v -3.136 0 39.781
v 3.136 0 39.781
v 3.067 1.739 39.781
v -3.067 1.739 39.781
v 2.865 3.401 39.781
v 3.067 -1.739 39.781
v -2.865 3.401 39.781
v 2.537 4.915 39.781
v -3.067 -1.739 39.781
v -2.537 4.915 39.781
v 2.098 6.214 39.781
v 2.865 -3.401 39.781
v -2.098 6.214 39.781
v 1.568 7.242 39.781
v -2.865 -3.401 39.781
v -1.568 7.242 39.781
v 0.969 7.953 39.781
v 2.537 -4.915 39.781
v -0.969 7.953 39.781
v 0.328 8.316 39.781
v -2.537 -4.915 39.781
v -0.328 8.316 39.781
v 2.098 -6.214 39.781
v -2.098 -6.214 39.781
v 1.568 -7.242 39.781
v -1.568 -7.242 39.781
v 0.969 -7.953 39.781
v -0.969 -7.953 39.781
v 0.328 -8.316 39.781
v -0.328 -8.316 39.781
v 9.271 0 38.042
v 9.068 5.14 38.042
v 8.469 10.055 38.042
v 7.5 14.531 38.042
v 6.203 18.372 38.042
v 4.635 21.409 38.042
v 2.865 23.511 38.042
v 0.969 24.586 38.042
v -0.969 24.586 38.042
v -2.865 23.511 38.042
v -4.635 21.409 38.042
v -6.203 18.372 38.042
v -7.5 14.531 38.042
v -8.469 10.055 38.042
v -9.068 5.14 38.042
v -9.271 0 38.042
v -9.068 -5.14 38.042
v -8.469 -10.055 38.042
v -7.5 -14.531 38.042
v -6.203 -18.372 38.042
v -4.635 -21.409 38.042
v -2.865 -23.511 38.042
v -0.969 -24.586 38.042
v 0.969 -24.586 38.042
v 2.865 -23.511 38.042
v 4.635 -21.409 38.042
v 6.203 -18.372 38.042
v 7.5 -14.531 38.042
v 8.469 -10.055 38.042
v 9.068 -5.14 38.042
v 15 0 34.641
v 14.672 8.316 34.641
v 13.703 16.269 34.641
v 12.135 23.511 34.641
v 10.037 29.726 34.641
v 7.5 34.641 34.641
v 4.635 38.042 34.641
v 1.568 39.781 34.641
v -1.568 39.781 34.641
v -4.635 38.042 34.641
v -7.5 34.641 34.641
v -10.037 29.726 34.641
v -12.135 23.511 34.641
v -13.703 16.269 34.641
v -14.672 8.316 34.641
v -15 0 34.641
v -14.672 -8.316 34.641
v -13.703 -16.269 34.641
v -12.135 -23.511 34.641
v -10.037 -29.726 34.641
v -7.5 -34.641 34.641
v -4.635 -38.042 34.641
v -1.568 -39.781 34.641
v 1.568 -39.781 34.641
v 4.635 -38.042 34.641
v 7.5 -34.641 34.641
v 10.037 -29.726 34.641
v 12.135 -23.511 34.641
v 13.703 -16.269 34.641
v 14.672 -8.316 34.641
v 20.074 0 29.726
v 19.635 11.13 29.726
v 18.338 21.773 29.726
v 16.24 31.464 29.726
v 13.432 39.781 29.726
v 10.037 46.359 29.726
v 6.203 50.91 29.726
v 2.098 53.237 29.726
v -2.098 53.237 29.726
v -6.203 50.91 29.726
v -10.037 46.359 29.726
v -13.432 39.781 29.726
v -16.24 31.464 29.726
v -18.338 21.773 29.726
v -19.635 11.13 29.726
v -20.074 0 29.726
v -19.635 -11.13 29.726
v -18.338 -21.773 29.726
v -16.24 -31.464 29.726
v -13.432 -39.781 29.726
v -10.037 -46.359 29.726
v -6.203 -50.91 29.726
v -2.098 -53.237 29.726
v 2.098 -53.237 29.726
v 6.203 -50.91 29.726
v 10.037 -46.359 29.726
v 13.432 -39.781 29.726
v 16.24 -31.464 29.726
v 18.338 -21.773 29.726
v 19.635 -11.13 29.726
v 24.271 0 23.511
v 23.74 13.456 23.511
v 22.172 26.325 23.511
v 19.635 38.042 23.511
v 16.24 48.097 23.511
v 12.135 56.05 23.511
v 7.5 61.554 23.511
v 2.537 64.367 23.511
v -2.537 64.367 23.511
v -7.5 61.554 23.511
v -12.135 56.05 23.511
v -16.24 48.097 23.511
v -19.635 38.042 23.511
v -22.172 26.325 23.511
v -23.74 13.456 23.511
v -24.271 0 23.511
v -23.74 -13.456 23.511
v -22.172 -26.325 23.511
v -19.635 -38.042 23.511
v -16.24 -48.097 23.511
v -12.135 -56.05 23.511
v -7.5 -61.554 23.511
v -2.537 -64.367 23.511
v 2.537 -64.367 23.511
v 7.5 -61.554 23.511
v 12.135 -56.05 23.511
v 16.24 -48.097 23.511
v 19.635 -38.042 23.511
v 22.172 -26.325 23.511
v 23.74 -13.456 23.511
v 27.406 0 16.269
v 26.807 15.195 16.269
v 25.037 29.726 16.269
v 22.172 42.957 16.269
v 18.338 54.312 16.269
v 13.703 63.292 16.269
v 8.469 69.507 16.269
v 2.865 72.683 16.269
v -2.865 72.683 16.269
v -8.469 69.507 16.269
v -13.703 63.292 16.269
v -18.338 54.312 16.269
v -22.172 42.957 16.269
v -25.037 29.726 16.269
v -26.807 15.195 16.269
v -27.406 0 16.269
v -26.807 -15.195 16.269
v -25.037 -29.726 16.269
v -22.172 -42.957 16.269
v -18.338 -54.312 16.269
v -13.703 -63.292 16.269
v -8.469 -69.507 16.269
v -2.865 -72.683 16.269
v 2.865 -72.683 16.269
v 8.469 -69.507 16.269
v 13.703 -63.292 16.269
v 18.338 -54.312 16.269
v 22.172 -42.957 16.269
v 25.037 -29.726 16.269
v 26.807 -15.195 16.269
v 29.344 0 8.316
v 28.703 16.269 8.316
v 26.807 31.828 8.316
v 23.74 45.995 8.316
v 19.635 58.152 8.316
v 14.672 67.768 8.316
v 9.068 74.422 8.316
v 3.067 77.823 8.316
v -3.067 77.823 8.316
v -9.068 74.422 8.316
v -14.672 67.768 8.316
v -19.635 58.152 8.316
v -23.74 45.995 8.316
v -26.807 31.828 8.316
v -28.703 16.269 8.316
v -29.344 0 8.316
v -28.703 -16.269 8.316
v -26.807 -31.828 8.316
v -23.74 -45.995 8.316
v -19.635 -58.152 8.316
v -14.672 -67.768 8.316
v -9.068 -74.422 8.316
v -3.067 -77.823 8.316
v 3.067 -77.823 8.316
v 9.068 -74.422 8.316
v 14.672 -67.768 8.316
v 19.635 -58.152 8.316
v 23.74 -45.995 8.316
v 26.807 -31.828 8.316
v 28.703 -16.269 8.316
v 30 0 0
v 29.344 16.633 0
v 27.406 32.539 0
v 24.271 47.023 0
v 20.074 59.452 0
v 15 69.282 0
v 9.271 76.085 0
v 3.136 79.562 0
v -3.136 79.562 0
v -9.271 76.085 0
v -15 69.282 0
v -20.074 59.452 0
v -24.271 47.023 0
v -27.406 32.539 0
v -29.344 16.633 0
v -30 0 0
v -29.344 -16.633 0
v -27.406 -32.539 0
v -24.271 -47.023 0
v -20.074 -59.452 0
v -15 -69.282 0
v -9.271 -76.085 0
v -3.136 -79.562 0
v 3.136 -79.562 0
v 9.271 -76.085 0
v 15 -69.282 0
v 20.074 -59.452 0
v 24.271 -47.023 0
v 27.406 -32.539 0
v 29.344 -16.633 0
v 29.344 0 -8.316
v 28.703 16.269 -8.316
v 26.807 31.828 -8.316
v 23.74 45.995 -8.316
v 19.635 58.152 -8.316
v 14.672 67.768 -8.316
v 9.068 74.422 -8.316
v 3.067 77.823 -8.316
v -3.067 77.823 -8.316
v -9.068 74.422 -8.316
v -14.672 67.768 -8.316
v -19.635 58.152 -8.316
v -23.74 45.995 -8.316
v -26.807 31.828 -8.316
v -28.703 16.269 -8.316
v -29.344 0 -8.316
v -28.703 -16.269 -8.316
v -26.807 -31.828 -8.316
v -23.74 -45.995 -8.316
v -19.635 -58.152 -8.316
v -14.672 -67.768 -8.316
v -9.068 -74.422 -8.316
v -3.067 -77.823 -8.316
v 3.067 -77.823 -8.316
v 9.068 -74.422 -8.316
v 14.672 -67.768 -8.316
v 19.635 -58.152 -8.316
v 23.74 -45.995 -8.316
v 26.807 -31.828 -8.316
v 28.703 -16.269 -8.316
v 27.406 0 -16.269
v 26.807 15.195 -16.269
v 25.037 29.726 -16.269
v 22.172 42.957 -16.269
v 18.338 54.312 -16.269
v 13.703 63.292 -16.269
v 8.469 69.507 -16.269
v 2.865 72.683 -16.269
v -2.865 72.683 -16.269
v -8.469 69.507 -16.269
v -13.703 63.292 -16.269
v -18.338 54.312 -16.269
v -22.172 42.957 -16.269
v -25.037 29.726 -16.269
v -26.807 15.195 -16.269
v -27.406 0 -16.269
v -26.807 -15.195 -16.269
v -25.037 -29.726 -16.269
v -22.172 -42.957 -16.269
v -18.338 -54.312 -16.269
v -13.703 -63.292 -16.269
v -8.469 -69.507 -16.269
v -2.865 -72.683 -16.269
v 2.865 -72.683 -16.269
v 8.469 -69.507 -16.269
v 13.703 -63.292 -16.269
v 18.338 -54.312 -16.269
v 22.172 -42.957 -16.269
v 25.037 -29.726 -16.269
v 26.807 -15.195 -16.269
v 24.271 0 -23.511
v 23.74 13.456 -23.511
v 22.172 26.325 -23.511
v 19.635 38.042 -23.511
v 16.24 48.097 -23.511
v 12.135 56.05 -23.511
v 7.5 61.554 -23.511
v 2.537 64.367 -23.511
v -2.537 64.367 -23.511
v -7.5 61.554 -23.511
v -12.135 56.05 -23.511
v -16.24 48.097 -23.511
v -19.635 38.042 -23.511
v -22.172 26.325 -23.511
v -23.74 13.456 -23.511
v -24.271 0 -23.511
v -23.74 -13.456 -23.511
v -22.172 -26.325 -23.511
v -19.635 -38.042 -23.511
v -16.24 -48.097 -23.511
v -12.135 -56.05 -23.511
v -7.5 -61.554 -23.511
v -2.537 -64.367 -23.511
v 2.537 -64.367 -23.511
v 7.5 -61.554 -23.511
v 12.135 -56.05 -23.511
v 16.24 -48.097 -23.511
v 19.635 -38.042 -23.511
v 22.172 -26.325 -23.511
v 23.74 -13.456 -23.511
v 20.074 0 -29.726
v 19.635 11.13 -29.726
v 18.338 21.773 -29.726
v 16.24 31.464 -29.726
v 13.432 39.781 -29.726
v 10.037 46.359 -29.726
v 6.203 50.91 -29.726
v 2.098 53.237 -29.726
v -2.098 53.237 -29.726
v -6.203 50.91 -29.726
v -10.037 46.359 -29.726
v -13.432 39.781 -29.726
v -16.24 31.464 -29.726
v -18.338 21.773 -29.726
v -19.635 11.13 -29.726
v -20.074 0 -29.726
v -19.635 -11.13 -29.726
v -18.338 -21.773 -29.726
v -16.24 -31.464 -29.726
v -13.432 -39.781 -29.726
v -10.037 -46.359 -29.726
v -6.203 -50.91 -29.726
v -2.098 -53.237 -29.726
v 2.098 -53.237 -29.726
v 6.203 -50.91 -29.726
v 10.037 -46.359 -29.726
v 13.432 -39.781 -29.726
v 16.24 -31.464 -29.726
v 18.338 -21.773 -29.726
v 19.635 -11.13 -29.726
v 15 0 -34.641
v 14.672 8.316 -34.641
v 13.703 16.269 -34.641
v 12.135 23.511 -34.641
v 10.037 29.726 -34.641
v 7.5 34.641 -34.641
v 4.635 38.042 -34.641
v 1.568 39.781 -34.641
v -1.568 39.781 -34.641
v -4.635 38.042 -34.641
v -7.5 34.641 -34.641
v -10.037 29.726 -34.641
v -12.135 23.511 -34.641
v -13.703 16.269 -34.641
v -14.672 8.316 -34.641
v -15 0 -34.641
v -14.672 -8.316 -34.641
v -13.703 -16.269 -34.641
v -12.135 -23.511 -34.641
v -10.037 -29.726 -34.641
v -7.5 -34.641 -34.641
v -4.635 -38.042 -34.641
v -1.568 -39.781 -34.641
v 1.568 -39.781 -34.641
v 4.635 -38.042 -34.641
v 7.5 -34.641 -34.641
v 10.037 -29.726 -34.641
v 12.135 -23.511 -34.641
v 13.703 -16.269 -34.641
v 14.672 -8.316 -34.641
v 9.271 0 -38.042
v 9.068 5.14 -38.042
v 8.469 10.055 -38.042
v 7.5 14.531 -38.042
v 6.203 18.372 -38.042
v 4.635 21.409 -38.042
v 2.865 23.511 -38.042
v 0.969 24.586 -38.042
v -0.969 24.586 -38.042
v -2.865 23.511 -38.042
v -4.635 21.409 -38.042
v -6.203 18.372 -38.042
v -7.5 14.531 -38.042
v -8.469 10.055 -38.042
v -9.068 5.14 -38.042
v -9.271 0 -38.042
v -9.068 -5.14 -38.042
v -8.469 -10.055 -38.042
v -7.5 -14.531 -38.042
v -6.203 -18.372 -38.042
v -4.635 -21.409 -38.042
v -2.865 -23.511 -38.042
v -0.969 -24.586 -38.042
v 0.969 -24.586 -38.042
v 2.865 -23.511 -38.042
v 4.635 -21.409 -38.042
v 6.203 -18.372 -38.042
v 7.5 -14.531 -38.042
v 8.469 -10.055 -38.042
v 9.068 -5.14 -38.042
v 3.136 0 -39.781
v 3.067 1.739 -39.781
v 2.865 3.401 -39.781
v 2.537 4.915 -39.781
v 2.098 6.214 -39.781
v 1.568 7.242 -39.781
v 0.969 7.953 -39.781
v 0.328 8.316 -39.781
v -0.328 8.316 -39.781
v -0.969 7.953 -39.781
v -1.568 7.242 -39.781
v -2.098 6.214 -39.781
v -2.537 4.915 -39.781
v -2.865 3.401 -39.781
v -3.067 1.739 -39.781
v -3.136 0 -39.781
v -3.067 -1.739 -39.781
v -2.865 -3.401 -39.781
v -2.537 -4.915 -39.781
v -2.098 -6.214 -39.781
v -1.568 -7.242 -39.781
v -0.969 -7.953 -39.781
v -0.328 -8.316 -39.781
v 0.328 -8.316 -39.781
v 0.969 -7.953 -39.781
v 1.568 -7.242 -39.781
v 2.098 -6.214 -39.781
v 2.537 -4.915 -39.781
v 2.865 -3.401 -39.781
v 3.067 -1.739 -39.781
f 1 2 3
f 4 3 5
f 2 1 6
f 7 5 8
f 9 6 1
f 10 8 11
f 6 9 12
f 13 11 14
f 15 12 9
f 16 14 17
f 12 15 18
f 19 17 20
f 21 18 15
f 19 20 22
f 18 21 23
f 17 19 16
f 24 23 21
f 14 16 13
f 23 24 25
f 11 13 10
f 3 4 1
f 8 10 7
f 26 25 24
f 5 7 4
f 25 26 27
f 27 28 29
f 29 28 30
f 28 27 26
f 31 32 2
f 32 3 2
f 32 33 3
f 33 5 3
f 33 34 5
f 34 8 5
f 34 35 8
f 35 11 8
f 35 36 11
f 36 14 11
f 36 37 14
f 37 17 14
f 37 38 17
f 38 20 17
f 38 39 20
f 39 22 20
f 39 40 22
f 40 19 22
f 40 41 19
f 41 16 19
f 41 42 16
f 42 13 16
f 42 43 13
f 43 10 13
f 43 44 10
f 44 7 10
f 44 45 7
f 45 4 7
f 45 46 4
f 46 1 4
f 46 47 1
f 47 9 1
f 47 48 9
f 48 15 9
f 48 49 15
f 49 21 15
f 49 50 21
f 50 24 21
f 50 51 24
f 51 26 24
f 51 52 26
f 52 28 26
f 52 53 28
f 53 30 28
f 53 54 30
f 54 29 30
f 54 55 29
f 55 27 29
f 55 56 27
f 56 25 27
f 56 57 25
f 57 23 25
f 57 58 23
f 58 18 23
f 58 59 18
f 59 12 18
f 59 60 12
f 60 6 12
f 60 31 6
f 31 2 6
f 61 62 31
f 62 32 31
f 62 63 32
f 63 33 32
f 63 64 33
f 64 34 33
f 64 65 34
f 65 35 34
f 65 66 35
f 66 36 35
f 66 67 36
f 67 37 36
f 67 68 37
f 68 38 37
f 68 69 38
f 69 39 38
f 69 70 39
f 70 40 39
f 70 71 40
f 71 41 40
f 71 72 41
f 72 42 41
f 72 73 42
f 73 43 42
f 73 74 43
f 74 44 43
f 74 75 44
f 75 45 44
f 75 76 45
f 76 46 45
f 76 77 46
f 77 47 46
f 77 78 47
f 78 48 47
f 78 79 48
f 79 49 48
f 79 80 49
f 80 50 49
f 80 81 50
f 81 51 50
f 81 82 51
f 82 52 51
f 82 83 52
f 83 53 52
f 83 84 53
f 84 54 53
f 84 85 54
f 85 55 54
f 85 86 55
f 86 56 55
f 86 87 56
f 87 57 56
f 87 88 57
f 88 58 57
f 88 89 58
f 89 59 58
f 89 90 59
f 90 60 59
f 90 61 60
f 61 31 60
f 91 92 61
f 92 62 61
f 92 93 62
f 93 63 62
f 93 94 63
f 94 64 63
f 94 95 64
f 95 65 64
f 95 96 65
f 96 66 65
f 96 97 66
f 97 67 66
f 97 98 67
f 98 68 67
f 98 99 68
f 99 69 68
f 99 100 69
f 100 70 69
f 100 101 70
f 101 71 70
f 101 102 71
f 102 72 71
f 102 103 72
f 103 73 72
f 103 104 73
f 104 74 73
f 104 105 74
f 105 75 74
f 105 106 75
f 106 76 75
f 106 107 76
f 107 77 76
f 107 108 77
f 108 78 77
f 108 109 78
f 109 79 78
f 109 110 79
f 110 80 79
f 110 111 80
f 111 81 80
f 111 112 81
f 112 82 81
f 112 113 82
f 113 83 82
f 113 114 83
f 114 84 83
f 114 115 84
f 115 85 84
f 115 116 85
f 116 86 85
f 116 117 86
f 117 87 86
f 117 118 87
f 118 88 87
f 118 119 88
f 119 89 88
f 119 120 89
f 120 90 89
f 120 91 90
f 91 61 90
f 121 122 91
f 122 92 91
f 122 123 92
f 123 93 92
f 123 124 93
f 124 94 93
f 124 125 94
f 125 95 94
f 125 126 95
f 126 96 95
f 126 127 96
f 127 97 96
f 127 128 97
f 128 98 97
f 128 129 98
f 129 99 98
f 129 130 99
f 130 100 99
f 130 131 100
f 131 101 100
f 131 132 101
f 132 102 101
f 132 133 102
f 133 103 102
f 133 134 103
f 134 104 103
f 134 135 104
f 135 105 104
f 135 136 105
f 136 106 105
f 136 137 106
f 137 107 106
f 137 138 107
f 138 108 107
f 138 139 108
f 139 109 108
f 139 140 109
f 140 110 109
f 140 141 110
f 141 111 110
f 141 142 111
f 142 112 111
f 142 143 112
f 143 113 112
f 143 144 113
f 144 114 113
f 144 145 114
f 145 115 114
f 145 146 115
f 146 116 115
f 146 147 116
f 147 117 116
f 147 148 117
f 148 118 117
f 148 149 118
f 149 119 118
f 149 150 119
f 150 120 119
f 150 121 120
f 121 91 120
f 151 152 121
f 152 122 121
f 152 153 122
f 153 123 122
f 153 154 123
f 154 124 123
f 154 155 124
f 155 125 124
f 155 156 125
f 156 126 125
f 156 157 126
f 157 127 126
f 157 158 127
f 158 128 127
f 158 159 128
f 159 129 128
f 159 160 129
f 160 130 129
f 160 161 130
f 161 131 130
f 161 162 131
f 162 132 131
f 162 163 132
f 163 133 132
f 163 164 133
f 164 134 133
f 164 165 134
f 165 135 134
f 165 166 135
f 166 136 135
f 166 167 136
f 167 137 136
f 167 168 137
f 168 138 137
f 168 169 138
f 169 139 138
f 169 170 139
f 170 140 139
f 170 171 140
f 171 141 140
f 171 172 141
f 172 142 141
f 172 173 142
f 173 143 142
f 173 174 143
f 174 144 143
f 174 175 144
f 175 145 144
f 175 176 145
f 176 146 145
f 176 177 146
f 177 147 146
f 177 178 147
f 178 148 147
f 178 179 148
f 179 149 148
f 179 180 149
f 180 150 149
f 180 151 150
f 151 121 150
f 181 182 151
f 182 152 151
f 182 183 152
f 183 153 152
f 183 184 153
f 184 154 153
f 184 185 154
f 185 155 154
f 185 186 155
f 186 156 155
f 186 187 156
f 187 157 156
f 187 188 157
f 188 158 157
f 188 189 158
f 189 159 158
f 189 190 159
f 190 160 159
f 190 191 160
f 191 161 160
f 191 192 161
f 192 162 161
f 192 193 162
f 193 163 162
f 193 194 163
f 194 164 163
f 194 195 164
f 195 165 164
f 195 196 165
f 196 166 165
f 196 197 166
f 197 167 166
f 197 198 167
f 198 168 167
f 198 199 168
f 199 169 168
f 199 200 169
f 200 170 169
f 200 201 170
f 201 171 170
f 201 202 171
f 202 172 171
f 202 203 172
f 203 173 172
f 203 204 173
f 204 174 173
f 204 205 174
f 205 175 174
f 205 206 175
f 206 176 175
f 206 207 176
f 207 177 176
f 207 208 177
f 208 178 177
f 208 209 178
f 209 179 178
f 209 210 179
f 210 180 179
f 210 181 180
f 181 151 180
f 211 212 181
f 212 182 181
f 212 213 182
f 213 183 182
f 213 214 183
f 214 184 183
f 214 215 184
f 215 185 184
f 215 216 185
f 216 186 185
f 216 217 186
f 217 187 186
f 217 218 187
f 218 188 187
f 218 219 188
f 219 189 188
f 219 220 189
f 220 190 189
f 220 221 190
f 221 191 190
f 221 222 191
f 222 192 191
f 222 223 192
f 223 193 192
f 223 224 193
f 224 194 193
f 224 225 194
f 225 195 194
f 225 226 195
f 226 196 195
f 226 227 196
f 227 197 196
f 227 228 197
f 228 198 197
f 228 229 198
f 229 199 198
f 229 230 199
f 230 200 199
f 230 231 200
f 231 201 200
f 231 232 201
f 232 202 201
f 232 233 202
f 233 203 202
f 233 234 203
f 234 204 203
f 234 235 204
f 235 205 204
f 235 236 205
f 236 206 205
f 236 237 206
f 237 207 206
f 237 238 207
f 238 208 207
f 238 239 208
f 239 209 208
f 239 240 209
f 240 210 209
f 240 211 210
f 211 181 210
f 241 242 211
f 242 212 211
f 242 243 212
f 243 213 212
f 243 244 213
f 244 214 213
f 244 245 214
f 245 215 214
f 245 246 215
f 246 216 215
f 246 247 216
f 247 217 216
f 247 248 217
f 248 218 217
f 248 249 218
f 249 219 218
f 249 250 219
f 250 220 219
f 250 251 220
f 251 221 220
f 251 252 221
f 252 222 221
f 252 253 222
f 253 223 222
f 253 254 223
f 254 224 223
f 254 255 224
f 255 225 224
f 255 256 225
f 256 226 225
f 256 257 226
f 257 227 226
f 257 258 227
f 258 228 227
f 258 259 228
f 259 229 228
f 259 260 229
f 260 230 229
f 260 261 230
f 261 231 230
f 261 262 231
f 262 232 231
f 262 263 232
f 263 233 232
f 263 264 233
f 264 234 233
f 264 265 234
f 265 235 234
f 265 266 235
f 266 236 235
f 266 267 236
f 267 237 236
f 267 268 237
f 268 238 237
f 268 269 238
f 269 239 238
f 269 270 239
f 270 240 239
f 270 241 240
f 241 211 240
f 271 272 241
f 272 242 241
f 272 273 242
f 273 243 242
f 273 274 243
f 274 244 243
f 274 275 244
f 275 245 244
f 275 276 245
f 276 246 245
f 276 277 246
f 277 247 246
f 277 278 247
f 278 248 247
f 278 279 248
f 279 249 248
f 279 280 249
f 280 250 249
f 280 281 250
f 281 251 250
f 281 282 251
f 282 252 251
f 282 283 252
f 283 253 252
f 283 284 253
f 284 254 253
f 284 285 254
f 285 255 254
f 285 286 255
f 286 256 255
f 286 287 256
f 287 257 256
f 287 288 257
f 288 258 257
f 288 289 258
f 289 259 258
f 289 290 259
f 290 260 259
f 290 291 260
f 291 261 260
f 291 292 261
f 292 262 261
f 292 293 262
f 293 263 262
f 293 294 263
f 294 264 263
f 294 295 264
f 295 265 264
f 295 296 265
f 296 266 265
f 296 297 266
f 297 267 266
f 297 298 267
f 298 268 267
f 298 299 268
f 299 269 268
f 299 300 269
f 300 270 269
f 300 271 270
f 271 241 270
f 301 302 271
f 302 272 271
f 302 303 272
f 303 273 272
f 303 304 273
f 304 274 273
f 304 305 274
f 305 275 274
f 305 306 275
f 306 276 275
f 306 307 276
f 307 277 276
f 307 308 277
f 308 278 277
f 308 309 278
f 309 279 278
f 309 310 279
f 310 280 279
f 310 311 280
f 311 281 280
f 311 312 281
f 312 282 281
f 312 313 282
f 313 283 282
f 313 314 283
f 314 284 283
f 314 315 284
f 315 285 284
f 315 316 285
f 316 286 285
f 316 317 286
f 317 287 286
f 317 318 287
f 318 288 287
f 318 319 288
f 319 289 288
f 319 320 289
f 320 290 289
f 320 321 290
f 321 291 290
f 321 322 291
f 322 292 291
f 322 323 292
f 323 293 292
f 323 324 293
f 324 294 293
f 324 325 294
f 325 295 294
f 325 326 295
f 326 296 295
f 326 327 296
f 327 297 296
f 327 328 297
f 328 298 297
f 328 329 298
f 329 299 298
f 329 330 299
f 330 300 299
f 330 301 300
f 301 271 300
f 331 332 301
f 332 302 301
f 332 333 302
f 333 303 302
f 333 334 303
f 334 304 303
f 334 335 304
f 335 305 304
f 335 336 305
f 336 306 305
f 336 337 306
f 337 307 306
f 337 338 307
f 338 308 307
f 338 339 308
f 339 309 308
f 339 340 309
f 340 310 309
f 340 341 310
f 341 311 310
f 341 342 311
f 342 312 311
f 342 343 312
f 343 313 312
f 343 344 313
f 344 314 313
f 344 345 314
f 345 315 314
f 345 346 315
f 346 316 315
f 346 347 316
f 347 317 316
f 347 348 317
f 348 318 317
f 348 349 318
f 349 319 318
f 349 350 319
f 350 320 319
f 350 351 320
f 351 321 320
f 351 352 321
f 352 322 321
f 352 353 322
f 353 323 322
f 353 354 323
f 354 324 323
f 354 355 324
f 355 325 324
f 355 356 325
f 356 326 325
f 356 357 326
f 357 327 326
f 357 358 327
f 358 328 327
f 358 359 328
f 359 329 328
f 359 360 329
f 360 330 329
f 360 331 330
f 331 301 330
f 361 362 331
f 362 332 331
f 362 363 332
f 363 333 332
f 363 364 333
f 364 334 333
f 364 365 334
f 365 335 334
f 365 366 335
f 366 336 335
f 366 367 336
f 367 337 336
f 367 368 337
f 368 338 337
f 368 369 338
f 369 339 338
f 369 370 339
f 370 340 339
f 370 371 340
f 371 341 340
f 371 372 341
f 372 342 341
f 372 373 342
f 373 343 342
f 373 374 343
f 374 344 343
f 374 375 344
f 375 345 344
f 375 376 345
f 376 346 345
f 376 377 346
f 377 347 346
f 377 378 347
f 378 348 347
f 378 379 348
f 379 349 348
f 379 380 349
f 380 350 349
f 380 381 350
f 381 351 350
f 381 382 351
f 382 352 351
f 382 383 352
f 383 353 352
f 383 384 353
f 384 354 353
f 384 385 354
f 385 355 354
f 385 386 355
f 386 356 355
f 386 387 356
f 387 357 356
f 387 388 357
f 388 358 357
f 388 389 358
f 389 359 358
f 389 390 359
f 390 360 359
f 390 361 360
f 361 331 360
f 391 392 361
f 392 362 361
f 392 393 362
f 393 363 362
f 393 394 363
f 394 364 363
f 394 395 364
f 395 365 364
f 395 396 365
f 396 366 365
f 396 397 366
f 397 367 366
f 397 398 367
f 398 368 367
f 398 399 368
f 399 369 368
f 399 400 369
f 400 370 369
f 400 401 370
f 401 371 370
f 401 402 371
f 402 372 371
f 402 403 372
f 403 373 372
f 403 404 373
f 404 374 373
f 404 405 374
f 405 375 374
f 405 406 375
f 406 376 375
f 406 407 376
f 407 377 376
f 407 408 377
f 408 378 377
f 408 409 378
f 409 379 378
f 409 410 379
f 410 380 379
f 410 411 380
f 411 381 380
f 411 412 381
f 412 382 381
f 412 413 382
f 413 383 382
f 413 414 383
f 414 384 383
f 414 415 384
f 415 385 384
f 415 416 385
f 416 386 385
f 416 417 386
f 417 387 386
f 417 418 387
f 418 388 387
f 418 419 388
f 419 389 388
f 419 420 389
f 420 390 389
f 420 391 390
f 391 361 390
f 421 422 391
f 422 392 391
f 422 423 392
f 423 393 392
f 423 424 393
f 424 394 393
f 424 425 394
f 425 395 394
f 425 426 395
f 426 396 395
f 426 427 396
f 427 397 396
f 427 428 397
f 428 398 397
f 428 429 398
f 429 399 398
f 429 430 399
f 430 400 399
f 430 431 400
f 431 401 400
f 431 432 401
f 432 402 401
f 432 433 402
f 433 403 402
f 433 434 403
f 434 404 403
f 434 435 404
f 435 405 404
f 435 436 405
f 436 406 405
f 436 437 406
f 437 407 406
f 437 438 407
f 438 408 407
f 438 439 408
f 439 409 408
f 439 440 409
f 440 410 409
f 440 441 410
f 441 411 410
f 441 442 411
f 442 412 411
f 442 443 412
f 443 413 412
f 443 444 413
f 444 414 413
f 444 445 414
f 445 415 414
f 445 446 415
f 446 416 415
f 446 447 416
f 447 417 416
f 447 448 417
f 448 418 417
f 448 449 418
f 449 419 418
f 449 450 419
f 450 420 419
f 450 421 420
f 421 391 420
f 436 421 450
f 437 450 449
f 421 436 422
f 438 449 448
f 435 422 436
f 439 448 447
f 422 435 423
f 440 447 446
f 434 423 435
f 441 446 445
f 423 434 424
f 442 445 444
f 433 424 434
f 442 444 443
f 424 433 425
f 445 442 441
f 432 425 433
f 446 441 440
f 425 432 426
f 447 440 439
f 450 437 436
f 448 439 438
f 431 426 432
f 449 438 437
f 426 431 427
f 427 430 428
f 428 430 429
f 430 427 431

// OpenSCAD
// SCALING
// scale([1, 1, 1]); = Shrinking and stretching a model along an axis
translate([0,0,0]){
    scale([1.5, 4, 2]){
     sphere(r = 20);   
    }
}
